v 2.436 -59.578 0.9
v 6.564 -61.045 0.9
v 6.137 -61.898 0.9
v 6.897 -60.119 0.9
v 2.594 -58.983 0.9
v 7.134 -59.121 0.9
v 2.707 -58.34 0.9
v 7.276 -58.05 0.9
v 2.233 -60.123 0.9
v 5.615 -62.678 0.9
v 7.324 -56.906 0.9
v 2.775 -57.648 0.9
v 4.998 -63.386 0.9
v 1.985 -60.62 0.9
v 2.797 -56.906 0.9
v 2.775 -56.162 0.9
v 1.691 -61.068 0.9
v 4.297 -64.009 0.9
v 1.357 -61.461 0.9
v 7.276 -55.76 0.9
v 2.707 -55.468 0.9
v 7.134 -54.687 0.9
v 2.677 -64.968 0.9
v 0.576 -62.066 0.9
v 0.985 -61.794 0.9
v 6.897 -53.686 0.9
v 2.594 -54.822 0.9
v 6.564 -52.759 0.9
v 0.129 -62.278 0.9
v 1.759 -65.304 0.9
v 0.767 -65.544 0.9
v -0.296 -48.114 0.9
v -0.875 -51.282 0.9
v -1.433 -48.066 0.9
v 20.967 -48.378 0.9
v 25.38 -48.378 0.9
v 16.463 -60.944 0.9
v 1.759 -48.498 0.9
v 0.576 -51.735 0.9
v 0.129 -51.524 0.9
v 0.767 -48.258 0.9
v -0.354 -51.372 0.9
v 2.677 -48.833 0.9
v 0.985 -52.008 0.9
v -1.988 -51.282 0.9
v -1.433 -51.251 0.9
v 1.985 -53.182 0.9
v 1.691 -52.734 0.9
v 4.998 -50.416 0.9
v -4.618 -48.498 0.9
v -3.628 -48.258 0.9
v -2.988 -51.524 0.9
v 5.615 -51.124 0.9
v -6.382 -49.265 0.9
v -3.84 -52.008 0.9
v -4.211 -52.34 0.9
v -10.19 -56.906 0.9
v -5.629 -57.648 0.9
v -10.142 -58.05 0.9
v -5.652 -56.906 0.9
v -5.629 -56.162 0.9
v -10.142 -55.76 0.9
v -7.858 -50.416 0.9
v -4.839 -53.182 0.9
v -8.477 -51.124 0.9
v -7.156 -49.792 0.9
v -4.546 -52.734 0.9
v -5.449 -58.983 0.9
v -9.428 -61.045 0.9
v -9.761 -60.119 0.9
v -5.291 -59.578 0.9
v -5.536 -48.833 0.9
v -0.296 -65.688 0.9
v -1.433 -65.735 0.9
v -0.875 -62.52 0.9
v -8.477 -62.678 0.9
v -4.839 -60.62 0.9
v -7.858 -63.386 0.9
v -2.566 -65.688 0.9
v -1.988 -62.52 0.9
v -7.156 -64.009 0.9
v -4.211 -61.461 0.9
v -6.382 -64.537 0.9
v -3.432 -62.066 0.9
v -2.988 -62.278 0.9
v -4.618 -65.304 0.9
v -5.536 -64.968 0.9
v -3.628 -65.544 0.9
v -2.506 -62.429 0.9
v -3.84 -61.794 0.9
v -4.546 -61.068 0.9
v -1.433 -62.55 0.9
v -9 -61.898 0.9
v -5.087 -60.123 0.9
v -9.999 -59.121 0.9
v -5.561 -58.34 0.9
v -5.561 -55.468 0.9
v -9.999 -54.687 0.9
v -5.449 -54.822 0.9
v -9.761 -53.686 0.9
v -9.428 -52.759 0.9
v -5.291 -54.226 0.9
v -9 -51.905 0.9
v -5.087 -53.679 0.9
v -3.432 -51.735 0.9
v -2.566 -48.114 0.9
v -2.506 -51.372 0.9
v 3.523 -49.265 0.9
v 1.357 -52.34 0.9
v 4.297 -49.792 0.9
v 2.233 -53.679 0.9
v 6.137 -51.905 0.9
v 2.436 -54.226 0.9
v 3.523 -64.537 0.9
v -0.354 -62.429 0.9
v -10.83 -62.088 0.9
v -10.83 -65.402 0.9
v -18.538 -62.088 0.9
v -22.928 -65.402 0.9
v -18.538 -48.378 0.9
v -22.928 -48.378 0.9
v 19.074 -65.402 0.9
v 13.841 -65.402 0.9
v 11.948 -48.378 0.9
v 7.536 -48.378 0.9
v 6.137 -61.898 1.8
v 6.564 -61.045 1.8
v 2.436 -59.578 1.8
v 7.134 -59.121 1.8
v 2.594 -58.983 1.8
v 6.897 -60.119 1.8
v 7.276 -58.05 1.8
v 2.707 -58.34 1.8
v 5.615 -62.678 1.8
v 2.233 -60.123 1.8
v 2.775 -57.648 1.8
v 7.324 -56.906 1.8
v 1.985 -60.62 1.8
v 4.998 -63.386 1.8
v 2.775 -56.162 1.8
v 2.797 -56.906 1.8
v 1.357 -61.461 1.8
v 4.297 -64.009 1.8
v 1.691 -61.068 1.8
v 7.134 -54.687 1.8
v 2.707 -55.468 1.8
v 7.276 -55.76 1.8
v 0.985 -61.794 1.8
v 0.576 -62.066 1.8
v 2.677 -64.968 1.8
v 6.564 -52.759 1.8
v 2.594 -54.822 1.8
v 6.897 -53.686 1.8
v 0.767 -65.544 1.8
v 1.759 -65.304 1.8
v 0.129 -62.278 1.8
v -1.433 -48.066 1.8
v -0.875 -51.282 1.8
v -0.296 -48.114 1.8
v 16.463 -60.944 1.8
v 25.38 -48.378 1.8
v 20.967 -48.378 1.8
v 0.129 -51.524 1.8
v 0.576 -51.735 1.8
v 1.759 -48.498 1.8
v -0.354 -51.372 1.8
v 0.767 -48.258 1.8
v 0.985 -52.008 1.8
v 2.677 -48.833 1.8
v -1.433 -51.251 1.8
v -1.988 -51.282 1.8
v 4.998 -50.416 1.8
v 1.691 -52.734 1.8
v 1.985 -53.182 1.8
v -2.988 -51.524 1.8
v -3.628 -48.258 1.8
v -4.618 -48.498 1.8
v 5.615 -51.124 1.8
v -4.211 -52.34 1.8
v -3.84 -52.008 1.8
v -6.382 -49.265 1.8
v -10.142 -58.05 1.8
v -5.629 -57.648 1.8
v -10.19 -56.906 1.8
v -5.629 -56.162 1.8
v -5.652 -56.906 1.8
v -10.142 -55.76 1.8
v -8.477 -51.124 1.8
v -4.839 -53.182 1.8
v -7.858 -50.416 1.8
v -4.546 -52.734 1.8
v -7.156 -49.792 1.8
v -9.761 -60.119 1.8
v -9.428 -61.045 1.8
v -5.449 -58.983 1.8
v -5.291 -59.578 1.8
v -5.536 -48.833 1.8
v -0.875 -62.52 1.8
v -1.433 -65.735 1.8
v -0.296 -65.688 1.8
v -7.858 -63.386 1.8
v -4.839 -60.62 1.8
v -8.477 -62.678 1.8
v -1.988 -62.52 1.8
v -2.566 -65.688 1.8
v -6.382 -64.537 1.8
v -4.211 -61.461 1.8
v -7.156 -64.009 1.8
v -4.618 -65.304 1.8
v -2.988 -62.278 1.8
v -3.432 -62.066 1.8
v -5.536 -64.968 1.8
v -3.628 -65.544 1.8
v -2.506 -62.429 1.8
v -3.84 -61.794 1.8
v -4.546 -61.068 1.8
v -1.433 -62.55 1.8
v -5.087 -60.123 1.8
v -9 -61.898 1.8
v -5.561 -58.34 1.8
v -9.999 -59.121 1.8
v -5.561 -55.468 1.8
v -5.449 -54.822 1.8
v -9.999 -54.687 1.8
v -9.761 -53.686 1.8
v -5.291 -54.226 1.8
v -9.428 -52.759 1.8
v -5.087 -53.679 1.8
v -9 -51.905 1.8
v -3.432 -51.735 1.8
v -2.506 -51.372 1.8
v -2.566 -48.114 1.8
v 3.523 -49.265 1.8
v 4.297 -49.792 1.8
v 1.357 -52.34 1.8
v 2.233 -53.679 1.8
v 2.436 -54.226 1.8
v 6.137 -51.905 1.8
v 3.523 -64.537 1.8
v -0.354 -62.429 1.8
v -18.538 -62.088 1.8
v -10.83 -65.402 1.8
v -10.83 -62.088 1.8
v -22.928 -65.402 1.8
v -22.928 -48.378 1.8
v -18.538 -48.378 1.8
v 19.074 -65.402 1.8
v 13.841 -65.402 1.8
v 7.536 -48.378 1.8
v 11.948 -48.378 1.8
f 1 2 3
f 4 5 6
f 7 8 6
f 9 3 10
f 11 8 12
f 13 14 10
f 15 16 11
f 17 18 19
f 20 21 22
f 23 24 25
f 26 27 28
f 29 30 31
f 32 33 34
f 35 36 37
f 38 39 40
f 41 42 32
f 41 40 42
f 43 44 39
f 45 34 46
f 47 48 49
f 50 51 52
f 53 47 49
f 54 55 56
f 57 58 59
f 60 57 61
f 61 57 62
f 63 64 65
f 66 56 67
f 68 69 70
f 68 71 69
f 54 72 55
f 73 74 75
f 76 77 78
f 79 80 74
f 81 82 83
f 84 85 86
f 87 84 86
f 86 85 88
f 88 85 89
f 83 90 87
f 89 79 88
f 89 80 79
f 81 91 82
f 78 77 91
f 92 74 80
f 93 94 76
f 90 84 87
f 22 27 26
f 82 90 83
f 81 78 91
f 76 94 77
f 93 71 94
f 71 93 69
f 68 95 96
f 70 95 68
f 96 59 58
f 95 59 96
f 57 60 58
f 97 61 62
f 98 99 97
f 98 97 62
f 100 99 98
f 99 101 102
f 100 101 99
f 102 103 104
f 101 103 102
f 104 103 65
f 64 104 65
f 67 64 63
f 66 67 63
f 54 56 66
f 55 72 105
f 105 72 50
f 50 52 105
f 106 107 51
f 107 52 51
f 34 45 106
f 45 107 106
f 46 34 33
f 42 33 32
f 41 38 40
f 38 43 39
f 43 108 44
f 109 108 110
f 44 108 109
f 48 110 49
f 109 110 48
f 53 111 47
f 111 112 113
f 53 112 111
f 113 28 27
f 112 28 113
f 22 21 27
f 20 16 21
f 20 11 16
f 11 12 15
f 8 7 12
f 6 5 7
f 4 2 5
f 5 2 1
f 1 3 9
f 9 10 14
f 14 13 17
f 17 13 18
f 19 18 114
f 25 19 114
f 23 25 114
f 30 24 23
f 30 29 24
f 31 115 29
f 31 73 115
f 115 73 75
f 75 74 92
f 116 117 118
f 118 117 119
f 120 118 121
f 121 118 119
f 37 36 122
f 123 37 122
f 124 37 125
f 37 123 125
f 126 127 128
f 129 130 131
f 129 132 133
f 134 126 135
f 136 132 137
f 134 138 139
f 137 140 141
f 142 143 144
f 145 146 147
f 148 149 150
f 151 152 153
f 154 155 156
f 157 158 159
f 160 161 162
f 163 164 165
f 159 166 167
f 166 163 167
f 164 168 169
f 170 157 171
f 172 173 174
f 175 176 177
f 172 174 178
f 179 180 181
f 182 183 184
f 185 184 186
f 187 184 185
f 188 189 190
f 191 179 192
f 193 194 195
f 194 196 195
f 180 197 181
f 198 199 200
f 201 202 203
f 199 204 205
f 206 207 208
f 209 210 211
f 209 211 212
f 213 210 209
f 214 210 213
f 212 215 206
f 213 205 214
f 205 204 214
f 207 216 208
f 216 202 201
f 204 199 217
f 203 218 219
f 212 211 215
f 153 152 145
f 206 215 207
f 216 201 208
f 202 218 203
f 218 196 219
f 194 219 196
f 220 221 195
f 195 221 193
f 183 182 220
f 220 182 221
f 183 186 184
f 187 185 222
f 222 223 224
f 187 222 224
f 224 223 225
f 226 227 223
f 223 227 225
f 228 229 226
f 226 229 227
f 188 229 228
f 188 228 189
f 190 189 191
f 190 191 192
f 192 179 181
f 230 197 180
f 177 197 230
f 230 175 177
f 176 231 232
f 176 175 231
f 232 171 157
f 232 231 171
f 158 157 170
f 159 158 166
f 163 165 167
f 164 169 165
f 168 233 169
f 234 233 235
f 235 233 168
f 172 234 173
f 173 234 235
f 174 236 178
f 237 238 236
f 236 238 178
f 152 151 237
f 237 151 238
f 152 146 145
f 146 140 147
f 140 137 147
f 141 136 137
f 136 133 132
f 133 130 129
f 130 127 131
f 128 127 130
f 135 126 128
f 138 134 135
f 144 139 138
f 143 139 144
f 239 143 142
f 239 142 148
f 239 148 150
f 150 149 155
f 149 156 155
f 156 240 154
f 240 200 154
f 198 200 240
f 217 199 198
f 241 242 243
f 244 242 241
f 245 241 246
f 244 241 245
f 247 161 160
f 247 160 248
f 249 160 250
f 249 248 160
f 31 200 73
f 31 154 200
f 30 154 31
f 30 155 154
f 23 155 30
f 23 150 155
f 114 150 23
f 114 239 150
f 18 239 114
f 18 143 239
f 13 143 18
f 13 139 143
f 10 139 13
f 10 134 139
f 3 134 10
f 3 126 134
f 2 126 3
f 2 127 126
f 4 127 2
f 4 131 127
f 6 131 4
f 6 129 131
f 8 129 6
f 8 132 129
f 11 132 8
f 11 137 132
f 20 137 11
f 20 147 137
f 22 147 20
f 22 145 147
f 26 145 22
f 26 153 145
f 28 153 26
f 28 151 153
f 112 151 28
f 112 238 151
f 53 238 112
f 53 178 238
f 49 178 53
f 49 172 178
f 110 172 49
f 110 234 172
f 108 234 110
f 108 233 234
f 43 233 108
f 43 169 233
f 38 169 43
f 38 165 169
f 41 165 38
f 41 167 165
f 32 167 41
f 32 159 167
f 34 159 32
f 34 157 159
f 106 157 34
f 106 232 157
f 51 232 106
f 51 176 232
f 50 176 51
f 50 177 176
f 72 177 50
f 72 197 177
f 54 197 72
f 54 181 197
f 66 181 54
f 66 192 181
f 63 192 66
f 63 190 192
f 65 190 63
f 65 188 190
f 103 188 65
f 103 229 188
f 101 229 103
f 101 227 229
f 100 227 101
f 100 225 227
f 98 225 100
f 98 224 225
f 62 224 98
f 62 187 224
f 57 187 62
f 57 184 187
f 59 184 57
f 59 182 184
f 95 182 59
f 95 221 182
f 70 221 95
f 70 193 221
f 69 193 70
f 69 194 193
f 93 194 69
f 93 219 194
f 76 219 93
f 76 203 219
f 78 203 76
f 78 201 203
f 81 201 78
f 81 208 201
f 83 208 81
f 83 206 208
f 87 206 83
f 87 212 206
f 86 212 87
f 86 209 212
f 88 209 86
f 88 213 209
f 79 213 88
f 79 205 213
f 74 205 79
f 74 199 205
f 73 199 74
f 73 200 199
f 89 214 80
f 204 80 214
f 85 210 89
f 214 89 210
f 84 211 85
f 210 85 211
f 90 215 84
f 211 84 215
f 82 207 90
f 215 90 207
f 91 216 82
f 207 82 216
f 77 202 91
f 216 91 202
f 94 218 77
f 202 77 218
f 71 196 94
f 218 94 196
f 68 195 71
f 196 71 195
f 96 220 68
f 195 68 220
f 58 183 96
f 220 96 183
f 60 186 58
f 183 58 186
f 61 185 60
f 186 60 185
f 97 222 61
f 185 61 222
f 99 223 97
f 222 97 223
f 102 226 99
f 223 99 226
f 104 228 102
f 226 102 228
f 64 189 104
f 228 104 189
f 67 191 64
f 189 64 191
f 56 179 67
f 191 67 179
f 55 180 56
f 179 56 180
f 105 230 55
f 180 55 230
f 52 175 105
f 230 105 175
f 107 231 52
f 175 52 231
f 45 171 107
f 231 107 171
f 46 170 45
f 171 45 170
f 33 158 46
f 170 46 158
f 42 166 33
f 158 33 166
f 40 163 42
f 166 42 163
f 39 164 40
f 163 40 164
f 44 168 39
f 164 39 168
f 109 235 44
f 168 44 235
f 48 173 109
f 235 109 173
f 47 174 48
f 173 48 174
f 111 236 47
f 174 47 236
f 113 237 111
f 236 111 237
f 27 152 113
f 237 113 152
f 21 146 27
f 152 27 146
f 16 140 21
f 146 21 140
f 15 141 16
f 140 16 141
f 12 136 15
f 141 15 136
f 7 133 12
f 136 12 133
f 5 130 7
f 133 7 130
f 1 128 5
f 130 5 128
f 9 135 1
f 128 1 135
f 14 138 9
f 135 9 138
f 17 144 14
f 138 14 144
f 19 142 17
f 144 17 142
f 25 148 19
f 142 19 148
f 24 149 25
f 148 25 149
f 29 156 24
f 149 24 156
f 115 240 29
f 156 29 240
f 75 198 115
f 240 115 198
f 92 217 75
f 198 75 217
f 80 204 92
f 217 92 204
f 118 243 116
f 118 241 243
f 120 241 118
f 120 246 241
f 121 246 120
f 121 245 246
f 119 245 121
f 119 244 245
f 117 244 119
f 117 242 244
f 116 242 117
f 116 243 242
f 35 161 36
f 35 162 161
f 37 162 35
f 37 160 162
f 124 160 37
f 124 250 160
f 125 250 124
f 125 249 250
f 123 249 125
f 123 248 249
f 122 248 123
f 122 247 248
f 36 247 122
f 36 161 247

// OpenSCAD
$fn = 48;
  // English (below bottom hole)
  translate([0, -57.100, 0.900]) linear_extrude(height=0.900) text("LOV", size=16.814, halign="center", valign="center", font="Helvetica Neue:style=Bold");
